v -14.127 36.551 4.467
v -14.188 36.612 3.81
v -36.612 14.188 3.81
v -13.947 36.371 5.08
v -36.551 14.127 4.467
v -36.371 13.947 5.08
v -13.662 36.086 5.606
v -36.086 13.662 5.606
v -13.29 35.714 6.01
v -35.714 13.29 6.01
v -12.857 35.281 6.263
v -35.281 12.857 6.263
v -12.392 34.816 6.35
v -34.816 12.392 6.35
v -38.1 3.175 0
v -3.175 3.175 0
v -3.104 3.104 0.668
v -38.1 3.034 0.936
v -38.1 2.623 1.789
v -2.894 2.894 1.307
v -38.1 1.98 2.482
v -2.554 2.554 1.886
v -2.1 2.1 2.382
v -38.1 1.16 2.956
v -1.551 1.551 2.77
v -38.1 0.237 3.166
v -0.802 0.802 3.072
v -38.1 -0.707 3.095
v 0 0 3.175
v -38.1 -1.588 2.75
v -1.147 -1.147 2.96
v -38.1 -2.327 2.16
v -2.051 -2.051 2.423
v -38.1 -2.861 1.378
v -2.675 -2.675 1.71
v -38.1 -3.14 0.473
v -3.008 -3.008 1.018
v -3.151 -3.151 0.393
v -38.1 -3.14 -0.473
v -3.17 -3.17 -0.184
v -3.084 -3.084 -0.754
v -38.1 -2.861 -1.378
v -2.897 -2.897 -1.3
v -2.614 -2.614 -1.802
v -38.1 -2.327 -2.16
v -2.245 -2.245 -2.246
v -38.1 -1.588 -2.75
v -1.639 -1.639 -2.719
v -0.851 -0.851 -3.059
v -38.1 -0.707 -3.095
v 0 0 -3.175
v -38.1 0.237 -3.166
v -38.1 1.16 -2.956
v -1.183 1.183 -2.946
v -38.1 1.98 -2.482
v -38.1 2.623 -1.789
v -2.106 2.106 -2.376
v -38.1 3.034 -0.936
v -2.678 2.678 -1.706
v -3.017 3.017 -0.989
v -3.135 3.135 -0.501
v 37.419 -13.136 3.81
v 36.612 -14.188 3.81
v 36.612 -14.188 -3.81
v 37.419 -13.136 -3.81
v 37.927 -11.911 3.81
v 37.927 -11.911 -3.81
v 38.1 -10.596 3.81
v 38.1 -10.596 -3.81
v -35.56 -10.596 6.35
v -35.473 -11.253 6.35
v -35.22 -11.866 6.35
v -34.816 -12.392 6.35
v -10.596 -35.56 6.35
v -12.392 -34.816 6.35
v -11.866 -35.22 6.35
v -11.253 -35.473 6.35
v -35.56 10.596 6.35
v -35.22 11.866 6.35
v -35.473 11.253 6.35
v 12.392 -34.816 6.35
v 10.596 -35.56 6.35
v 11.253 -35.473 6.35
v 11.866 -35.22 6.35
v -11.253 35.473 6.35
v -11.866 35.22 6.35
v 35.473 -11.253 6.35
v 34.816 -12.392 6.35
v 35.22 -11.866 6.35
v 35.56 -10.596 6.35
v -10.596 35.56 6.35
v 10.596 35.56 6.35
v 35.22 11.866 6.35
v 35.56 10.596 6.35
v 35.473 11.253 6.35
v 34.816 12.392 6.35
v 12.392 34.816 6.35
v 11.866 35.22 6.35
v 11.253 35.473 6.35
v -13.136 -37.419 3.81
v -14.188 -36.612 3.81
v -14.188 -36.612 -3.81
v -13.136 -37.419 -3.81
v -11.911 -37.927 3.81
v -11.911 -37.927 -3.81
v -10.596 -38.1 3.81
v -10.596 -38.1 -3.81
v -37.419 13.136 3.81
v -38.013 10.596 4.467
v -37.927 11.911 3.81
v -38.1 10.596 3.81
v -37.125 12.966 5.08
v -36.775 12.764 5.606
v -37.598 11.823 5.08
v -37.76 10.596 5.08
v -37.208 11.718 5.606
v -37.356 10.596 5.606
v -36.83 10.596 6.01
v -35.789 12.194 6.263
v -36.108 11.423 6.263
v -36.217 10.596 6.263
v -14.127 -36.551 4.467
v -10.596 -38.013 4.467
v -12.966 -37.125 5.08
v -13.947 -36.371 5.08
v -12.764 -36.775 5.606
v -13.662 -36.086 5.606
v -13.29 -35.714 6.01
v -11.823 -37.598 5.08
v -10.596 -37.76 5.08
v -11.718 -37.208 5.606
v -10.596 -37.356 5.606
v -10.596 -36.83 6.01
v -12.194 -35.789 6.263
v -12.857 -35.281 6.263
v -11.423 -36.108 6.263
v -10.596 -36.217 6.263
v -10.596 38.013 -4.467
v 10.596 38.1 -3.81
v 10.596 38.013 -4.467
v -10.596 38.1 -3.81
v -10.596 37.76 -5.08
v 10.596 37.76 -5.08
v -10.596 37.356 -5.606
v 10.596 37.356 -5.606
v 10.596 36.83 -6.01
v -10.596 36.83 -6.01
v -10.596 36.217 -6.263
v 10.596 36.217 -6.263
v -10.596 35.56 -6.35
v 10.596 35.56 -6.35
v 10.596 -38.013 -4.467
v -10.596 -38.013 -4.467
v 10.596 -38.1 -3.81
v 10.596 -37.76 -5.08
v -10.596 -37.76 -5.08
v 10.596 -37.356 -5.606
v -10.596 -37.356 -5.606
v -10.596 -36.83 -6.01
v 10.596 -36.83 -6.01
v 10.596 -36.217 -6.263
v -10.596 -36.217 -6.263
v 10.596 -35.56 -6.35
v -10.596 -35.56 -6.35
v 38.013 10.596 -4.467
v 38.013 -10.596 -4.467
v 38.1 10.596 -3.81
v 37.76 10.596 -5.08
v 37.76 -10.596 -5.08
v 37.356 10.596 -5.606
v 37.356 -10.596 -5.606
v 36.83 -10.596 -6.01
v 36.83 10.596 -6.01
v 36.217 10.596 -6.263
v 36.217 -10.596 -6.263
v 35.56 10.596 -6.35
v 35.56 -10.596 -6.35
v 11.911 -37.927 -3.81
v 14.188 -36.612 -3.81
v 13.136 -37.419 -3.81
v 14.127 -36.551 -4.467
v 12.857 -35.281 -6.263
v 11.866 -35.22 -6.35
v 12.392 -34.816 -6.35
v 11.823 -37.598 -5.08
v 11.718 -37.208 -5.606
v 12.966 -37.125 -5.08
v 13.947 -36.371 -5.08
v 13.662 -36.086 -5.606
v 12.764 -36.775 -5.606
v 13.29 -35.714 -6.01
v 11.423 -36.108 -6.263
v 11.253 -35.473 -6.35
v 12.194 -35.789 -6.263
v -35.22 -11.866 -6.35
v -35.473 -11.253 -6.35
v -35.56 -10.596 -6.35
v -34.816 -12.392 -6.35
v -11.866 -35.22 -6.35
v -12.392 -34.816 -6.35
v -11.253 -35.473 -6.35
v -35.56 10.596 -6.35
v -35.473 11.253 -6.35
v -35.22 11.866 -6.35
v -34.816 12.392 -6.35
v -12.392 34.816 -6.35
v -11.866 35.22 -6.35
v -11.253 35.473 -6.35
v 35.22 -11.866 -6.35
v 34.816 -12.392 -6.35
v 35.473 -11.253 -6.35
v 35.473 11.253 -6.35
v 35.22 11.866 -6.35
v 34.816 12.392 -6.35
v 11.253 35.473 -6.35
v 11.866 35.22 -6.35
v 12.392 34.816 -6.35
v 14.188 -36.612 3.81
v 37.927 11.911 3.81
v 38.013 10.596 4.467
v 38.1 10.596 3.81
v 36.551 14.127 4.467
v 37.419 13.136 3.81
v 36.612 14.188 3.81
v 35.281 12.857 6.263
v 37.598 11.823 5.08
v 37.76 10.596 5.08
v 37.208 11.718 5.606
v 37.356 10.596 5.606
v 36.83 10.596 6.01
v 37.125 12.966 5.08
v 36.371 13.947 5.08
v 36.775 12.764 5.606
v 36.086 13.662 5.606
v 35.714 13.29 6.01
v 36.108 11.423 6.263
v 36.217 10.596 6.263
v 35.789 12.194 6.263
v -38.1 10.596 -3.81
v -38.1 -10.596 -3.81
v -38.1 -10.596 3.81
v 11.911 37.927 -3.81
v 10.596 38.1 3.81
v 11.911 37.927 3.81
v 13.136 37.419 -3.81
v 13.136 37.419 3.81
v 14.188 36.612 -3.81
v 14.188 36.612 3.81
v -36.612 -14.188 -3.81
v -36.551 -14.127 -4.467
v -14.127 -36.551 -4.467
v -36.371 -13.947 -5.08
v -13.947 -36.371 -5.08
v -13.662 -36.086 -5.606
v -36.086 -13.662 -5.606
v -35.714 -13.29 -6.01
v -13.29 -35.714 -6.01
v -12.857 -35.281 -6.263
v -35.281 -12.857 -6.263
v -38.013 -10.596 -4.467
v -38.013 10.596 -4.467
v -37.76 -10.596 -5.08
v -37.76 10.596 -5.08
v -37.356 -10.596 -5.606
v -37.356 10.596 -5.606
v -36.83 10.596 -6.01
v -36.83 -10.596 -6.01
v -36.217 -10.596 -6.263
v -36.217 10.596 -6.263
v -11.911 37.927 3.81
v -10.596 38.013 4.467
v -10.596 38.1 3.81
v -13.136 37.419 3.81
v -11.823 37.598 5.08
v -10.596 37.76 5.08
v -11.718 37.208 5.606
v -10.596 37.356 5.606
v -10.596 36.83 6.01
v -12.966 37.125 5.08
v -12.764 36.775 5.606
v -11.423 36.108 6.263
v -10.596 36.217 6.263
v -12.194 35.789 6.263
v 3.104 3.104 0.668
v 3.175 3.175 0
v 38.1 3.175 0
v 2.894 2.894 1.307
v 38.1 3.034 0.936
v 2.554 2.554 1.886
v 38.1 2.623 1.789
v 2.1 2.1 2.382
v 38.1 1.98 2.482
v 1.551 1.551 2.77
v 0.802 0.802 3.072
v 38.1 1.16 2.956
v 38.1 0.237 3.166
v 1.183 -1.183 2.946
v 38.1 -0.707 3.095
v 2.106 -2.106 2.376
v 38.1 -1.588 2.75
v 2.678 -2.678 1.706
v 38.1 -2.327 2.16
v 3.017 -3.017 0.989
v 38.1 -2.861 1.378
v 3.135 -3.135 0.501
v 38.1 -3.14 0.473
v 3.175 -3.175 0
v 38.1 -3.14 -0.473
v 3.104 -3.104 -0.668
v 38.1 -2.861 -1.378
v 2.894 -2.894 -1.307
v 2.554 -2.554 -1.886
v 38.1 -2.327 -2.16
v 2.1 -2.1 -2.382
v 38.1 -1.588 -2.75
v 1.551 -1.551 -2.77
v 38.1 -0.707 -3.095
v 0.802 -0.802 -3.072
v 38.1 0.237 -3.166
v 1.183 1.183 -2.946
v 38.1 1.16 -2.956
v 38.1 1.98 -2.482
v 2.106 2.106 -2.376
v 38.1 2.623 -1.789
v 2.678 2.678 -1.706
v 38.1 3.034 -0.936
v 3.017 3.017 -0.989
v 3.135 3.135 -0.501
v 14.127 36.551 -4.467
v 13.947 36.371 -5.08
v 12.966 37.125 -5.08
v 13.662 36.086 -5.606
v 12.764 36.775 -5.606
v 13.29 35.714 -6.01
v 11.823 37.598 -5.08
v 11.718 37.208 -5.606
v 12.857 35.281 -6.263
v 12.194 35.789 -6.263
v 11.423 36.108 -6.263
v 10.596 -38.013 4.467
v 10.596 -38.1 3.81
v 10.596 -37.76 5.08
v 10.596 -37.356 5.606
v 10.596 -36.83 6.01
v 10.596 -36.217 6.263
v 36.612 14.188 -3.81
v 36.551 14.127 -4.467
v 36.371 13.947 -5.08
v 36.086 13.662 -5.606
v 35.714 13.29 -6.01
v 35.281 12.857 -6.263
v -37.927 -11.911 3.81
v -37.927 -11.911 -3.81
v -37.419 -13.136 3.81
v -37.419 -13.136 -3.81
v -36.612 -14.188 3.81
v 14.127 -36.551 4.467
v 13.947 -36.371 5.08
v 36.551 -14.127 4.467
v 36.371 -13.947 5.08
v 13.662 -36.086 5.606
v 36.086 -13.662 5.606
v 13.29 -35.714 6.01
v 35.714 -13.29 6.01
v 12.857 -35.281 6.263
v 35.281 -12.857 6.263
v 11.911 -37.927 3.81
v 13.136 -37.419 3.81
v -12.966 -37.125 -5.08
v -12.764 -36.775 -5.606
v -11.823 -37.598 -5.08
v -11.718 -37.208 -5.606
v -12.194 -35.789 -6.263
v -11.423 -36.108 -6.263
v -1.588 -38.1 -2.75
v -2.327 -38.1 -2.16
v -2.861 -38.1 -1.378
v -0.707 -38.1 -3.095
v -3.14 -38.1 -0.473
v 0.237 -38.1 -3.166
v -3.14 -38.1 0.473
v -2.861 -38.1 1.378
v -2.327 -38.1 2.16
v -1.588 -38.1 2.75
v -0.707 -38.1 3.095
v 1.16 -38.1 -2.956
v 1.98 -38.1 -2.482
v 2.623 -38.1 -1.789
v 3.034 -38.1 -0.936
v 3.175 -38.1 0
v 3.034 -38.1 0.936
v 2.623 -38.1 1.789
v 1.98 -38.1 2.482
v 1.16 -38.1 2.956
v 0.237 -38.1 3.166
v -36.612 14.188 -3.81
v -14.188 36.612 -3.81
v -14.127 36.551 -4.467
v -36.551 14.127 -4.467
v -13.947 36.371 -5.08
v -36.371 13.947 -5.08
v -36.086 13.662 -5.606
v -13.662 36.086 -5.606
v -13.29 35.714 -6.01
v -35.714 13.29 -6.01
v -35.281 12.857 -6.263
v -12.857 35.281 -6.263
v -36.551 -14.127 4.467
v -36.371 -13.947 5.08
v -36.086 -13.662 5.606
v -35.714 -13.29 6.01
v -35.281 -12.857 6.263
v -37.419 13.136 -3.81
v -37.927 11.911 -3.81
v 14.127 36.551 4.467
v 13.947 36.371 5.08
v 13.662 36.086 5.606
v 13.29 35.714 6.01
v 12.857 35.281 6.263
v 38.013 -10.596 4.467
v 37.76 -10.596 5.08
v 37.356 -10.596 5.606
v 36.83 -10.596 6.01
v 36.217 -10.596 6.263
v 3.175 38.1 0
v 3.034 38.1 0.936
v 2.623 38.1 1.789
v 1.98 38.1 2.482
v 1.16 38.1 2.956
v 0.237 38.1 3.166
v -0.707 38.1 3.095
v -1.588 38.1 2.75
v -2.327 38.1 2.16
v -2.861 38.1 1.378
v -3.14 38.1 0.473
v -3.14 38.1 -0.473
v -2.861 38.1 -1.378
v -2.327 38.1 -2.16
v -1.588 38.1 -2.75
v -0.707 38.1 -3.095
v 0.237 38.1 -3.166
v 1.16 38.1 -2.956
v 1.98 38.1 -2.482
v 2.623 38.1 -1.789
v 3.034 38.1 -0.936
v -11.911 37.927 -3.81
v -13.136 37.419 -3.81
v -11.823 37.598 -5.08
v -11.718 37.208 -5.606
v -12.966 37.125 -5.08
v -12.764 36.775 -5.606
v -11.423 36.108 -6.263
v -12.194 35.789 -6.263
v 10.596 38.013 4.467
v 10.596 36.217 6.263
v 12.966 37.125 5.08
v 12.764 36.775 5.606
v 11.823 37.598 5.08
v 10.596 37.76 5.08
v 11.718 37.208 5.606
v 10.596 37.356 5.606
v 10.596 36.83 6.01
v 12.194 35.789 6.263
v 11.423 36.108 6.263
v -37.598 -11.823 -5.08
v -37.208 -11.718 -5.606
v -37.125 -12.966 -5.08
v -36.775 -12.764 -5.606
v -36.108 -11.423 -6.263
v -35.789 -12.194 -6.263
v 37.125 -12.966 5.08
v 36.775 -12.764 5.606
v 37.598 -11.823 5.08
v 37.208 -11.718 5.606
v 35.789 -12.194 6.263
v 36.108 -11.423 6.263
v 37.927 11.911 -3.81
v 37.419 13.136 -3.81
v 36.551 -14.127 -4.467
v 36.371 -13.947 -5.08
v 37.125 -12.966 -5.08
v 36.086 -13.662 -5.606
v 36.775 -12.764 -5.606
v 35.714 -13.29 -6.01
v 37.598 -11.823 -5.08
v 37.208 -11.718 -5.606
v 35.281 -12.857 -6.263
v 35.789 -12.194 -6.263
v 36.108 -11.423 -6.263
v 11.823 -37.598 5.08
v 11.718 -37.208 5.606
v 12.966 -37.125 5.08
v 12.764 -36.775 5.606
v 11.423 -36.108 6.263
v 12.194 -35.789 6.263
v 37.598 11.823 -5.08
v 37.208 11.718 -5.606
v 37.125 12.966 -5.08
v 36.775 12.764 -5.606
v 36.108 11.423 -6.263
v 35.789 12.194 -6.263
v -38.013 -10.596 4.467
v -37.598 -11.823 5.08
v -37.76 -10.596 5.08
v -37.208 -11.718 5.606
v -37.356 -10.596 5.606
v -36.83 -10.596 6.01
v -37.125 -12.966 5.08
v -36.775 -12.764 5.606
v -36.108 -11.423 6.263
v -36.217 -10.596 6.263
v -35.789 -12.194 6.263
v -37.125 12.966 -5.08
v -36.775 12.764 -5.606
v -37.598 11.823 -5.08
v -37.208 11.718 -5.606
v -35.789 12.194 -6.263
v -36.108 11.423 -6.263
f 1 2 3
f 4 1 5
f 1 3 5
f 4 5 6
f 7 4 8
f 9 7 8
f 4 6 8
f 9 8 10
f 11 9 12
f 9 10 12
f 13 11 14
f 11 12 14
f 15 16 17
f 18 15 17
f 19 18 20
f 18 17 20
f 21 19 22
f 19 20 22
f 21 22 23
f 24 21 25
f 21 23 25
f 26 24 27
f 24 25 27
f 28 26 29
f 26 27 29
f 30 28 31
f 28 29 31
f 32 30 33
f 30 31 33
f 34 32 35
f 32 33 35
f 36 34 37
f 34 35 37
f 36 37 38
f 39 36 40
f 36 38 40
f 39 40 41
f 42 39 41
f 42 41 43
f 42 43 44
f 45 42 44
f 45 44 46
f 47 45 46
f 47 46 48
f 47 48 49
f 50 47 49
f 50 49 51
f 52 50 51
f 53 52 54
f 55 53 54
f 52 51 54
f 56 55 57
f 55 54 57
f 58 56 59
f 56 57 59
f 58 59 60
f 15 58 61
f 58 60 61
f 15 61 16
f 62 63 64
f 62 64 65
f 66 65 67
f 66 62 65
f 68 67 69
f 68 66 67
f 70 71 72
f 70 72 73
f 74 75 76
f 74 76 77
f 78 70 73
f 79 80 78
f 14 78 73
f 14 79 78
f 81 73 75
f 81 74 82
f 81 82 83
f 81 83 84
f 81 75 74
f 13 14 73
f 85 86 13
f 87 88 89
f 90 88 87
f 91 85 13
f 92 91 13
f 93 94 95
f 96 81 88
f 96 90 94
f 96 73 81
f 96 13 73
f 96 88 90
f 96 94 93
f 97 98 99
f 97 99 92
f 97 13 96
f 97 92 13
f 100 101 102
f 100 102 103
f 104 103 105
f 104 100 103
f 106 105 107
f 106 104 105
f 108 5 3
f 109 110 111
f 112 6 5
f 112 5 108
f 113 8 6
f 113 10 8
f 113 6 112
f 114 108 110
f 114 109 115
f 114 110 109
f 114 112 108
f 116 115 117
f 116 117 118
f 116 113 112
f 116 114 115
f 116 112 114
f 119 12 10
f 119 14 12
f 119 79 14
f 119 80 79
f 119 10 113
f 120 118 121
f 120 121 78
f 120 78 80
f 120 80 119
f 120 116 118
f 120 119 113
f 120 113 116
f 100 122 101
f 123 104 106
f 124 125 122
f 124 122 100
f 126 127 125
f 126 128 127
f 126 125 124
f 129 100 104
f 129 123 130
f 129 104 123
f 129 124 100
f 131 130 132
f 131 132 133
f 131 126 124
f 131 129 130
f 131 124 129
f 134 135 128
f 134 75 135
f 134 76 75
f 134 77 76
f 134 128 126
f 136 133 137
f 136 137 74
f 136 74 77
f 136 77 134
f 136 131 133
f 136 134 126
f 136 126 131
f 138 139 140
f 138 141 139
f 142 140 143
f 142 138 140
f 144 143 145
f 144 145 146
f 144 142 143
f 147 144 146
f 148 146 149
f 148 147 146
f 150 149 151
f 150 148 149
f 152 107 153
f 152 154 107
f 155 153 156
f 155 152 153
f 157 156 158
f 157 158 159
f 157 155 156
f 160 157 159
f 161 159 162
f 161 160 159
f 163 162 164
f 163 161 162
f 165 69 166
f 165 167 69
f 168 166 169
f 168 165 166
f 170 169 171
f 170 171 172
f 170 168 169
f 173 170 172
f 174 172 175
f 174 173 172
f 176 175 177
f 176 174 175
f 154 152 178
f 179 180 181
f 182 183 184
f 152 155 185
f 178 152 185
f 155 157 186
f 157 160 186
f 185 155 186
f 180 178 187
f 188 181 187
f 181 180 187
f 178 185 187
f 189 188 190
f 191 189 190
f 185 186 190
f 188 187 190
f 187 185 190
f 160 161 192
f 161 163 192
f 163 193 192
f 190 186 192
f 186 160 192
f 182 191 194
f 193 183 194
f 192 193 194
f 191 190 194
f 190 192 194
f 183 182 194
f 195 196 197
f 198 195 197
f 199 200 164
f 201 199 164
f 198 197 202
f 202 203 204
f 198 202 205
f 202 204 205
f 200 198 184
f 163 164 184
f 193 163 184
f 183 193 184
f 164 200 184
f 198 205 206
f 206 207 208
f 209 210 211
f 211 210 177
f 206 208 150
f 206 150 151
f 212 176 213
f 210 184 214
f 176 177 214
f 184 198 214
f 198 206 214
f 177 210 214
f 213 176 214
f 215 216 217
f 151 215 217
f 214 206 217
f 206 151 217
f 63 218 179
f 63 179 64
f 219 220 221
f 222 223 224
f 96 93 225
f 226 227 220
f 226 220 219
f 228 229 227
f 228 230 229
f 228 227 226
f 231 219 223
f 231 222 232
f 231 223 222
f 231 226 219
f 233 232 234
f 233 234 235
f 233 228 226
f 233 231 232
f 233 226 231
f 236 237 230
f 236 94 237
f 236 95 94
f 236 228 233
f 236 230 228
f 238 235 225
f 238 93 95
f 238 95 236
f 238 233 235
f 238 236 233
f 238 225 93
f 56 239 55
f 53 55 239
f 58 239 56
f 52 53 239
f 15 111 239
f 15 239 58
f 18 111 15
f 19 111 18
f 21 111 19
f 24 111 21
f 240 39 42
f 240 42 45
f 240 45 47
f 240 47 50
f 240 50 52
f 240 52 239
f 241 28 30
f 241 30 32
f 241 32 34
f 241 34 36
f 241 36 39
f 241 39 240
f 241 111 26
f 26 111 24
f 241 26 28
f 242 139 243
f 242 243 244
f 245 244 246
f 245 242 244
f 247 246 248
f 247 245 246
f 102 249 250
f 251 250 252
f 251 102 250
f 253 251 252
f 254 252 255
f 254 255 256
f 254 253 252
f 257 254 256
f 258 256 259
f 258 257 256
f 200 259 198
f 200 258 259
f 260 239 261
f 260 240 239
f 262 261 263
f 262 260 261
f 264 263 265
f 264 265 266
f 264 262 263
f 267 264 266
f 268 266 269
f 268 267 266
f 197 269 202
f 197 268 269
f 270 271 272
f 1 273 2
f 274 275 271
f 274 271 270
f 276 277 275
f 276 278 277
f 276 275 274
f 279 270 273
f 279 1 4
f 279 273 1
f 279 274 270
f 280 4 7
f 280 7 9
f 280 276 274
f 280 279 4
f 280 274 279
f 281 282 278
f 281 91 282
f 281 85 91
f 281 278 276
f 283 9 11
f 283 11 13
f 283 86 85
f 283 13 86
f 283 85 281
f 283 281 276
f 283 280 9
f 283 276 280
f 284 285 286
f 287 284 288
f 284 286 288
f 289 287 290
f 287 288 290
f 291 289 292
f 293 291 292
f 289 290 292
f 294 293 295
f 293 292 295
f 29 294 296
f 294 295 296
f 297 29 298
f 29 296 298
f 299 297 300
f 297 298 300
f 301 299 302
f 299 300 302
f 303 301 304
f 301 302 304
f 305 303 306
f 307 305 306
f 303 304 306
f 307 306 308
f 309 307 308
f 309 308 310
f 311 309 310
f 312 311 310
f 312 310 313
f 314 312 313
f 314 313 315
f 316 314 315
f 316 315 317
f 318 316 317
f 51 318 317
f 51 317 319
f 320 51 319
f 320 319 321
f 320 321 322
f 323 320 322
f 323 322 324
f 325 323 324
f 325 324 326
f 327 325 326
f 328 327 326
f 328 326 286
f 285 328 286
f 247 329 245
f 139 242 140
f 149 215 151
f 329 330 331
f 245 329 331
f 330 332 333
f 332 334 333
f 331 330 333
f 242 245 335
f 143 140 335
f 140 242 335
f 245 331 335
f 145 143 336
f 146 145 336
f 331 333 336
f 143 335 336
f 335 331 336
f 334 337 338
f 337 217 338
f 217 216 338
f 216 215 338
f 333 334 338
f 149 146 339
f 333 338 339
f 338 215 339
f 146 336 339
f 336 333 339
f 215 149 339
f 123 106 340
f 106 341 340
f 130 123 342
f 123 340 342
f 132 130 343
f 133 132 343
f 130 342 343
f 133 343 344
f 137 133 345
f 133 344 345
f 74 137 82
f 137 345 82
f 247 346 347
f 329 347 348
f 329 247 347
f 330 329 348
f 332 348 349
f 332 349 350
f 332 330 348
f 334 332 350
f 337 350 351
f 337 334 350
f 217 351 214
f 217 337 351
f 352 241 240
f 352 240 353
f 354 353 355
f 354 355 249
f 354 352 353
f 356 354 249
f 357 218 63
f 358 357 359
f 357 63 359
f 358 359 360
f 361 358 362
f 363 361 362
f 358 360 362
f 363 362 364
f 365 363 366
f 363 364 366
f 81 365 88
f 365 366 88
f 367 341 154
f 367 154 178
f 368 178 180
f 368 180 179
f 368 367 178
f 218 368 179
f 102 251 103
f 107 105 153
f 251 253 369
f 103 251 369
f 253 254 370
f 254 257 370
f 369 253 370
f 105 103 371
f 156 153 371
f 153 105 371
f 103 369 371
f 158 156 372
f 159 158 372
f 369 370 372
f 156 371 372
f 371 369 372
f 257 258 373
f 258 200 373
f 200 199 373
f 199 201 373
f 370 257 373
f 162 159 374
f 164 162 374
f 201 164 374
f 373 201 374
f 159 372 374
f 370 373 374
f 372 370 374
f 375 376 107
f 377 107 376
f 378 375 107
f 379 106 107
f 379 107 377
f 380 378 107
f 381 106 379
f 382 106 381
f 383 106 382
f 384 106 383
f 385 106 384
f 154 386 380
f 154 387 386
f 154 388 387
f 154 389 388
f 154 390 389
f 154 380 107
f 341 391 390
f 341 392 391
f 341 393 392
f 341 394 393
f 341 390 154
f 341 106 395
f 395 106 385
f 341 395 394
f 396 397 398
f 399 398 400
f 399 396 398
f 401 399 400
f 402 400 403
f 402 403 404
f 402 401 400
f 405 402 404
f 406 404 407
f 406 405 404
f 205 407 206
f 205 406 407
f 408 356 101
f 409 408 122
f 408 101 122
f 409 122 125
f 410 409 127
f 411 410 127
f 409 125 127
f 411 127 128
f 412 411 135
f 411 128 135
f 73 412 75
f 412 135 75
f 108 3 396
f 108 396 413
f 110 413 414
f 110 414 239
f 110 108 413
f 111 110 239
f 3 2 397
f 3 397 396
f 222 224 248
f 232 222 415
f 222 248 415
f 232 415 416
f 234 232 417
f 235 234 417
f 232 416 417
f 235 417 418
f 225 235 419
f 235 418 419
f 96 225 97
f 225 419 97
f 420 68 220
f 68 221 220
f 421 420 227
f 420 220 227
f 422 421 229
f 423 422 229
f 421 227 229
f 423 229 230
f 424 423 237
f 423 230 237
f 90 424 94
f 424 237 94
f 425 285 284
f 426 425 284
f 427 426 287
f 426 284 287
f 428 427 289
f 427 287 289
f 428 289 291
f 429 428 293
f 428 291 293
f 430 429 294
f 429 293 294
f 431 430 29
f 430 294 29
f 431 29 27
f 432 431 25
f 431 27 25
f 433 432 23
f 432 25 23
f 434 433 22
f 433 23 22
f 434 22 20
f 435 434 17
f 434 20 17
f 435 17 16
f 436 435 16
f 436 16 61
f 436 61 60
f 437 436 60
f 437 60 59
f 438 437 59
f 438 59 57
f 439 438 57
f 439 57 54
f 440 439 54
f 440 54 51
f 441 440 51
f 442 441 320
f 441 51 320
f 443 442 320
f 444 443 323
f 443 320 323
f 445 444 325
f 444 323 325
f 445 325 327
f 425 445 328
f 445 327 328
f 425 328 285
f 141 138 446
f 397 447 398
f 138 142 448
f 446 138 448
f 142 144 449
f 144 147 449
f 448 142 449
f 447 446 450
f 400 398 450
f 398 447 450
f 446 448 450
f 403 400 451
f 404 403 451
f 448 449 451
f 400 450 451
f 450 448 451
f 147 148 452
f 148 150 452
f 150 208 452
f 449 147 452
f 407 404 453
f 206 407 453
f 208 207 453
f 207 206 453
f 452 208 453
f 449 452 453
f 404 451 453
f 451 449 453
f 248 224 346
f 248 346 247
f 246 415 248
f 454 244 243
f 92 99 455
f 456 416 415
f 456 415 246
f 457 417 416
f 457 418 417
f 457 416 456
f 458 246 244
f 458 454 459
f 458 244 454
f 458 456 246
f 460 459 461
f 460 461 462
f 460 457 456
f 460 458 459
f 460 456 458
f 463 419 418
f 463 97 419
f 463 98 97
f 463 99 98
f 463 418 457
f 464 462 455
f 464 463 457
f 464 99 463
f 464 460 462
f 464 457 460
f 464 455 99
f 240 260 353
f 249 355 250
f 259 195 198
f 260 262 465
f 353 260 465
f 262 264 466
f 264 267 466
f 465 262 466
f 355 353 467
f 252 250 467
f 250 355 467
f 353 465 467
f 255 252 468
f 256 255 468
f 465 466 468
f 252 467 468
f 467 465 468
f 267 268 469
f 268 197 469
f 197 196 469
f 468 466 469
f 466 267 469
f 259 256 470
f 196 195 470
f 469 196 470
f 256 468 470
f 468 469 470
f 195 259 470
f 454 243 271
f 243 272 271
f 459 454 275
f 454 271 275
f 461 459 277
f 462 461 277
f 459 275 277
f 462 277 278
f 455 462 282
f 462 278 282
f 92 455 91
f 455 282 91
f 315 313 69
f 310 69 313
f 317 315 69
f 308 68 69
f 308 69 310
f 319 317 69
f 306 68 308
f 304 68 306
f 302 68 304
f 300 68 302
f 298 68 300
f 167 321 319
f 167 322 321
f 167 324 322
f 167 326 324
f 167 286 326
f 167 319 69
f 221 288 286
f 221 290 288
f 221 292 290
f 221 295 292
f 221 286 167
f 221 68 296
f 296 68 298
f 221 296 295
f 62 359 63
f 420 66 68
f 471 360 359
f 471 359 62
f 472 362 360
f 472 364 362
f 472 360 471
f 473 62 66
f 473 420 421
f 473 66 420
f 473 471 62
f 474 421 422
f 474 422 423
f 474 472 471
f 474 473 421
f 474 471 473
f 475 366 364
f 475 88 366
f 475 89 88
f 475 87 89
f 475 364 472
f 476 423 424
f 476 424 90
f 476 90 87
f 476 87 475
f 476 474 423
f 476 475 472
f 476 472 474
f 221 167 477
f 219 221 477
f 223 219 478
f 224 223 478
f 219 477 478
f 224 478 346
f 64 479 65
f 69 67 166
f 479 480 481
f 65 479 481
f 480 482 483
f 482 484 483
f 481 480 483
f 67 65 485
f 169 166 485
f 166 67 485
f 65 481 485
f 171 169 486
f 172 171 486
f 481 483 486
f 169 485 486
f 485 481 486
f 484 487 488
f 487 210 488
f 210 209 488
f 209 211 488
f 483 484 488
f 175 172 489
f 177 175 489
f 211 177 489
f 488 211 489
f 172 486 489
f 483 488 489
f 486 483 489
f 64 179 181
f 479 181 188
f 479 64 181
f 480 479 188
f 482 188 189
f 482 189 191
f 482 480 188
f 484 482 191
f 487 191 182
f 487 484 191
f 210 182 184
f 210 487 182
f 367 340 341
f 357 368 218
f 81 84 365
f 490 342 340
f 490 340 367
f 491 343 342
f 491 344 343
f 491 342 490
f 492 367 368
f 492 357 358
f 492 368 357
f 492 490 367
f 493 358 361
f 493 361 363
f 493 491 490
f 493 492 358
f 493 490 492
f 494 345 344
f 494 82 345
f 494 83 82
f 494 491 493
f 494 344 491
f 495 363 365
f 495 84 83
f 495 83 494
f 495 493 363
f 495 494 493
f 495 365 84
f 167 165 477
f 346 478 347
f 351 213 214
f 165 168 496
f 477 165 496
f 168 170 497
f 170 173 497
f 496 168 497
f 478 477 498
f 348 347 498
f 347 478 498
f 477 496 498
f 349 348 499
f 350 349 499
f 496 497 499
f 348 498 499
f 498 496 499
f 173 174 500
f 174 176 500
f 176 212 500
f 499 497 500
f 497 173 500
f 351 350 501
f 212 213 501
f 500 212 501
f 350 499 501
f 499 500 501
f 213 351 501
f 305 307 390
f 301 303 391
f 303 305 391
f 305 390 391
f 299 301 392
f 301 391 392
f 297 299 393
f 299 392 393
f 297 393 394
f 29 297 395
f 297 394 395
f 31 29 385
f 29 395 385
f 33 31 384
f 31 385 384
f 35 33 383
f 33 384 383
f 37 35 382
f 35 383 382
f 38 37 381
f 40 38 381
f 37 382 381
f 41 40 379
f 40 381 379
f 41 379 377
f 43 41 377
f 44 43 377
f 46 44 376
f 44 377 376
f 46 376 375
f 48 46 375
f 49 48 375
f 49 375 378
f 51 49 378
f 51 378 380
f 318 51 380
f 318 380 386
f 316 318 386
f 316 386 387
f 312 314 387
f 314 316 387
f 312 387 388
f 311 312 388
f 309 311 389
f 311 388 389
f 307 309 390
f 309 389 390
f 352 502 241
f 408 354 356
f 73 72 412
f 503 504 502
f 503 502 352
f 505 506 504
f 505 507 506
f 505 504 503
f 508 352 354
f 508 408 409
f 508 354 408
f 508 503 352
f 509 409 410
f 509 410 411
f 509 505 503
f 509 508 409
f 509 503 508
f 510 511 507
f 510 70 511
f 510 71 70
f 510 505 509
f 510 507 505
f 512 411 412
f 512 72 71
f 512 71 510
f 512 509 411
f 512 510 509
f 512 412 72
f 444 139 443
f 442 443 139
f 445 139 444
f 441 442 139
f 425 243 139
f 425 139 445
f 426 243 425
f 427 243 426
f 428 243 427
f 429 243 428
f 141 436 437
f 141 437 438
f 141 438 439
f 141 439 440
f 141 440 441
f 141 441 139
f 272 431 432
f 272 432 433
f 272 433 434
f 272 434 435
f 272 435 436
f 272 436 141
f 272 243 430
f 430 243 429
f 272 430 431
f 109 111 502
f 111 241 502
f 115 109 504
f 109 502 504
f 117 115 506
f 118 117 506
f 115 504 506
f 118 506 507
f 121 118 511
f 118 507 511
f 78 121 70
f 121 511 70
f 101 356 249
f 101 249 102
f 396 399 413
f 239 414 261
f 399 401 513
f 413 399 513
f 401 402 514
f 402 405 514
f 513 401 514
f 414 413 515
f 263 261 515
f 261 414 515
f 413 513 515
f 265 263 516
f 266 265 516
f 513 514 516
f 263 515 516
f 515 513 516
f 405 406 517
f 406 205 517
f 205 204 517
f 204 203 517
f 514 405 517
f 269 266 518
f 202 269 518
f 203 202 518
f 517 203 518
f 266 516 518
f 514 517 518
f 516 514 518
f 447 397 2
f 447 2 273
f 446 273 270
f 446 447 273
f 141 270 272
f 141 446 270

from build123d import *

# Parameters (mm, degrees)
F1_DEPTH = 6.35
F3_D     = 6.35
F4_R     = 5.08
F5_R     = 2.54
F7_D     = 6.35


with BuildPart() as f1:
    # F0 (on Top) → F1 (new body, symmetric)
    with BuildSketch(Plane.XY):
        Polygon((-12.7, 38.1), (-38.1, 12.7), (-38.1, -12.7), (-12.7, -38.1), (12.7, -38.1), (38.1, -12.7), (38.1, 12.7), (12.7, 38.1), align=None)
    extrude(amount=F1_DEPTH, both=True)

    # F3 (through all)
    with Locations(Plane(origin=(-38.1, 0, 0), x_dir=(0, -1, 0), z_dir=(-1, 0, 0))):
        with Locations((0, 0)):
            Hole(F3_D / 2)

    # F4
    f4_edges = [f1.edges().sort_by_distance(p)[0] for p in [
        (-12.7, 38.1, 0),
        (-38.1, 12.7, 0),
        (12.7, 38.1, 0),
        (38.1, 12.7, 0),
        (-38.1, -12.7, 0),
        (-12.7, -38.1, 0),
        (12.7, -38.1, 0),
        (38.1, -12.7, 0),
    ]]
    fillet(f4_edges, radius=F4_R)

    # F5
    f5_edges = [f1.edges().sort_by_distance(p)[0] for p in [
        (-25.4, 25.4, 6.35),
        (-12.539827, 37.713308, 6.35),
        (-37.713308, 12.539827, 6.35),
        (0, 38.1, 6.35),
        (-38.1, 0, 6.35),
        (12.539827, 37.713308, 6.35),
        (-37.713308, -12.539827, 6.35),
        (25.4, 25.4, 6.35),
        (-25.4, -25.4, 6.35),
        (37.713308, 12.539827, 6.35),
        (-12.539827, -37.713308, 6.35),
        (38.1, 0, 6.35),
        (0, -38.1, 6.35),
        (37.713308, -12.539827, 6.35),
        (12.539827, -37.713308, 6.35),
        (25.4, -25.4, 6.35),
        (-25.4, 25.4, -6.35),
        (-12.539827, 37.713308, -6.35),
        (-37.713308, 12.539827, -6.35),
        (0, 38.1, -6.35),
        (-38.1, 0, -6.35),
        (12.539827, 37.713308, -6.35),
        (-37.713308, -12.539827, -6.35),
        (25.4, 25.4, -6.35),
        (-25.4, -25.4, -6.35),
        (37.713308, 12.539827, -6.35),
        (-12.539827, -37.713308, -6.35),
        (38.1, 0, -6.35),
        (0, -38.1, -6.35),
        (37.713308, -12.539827, -6.35),
        (12.539827, -37.713308, -6.35),
        (25.4, -25.4, -6.35),
    ]]
    fillet(f5_edges, radius=F5_R)

    # F7 (through all)
    with Locations(Plane(origin=(0, 38.1, 0), x_dir=(-1, 0, 0), z_dir=(0, 1, 0))):
        with Locations((0, 0)):
            Hole(F7_D / 2)


solid = f1.part
